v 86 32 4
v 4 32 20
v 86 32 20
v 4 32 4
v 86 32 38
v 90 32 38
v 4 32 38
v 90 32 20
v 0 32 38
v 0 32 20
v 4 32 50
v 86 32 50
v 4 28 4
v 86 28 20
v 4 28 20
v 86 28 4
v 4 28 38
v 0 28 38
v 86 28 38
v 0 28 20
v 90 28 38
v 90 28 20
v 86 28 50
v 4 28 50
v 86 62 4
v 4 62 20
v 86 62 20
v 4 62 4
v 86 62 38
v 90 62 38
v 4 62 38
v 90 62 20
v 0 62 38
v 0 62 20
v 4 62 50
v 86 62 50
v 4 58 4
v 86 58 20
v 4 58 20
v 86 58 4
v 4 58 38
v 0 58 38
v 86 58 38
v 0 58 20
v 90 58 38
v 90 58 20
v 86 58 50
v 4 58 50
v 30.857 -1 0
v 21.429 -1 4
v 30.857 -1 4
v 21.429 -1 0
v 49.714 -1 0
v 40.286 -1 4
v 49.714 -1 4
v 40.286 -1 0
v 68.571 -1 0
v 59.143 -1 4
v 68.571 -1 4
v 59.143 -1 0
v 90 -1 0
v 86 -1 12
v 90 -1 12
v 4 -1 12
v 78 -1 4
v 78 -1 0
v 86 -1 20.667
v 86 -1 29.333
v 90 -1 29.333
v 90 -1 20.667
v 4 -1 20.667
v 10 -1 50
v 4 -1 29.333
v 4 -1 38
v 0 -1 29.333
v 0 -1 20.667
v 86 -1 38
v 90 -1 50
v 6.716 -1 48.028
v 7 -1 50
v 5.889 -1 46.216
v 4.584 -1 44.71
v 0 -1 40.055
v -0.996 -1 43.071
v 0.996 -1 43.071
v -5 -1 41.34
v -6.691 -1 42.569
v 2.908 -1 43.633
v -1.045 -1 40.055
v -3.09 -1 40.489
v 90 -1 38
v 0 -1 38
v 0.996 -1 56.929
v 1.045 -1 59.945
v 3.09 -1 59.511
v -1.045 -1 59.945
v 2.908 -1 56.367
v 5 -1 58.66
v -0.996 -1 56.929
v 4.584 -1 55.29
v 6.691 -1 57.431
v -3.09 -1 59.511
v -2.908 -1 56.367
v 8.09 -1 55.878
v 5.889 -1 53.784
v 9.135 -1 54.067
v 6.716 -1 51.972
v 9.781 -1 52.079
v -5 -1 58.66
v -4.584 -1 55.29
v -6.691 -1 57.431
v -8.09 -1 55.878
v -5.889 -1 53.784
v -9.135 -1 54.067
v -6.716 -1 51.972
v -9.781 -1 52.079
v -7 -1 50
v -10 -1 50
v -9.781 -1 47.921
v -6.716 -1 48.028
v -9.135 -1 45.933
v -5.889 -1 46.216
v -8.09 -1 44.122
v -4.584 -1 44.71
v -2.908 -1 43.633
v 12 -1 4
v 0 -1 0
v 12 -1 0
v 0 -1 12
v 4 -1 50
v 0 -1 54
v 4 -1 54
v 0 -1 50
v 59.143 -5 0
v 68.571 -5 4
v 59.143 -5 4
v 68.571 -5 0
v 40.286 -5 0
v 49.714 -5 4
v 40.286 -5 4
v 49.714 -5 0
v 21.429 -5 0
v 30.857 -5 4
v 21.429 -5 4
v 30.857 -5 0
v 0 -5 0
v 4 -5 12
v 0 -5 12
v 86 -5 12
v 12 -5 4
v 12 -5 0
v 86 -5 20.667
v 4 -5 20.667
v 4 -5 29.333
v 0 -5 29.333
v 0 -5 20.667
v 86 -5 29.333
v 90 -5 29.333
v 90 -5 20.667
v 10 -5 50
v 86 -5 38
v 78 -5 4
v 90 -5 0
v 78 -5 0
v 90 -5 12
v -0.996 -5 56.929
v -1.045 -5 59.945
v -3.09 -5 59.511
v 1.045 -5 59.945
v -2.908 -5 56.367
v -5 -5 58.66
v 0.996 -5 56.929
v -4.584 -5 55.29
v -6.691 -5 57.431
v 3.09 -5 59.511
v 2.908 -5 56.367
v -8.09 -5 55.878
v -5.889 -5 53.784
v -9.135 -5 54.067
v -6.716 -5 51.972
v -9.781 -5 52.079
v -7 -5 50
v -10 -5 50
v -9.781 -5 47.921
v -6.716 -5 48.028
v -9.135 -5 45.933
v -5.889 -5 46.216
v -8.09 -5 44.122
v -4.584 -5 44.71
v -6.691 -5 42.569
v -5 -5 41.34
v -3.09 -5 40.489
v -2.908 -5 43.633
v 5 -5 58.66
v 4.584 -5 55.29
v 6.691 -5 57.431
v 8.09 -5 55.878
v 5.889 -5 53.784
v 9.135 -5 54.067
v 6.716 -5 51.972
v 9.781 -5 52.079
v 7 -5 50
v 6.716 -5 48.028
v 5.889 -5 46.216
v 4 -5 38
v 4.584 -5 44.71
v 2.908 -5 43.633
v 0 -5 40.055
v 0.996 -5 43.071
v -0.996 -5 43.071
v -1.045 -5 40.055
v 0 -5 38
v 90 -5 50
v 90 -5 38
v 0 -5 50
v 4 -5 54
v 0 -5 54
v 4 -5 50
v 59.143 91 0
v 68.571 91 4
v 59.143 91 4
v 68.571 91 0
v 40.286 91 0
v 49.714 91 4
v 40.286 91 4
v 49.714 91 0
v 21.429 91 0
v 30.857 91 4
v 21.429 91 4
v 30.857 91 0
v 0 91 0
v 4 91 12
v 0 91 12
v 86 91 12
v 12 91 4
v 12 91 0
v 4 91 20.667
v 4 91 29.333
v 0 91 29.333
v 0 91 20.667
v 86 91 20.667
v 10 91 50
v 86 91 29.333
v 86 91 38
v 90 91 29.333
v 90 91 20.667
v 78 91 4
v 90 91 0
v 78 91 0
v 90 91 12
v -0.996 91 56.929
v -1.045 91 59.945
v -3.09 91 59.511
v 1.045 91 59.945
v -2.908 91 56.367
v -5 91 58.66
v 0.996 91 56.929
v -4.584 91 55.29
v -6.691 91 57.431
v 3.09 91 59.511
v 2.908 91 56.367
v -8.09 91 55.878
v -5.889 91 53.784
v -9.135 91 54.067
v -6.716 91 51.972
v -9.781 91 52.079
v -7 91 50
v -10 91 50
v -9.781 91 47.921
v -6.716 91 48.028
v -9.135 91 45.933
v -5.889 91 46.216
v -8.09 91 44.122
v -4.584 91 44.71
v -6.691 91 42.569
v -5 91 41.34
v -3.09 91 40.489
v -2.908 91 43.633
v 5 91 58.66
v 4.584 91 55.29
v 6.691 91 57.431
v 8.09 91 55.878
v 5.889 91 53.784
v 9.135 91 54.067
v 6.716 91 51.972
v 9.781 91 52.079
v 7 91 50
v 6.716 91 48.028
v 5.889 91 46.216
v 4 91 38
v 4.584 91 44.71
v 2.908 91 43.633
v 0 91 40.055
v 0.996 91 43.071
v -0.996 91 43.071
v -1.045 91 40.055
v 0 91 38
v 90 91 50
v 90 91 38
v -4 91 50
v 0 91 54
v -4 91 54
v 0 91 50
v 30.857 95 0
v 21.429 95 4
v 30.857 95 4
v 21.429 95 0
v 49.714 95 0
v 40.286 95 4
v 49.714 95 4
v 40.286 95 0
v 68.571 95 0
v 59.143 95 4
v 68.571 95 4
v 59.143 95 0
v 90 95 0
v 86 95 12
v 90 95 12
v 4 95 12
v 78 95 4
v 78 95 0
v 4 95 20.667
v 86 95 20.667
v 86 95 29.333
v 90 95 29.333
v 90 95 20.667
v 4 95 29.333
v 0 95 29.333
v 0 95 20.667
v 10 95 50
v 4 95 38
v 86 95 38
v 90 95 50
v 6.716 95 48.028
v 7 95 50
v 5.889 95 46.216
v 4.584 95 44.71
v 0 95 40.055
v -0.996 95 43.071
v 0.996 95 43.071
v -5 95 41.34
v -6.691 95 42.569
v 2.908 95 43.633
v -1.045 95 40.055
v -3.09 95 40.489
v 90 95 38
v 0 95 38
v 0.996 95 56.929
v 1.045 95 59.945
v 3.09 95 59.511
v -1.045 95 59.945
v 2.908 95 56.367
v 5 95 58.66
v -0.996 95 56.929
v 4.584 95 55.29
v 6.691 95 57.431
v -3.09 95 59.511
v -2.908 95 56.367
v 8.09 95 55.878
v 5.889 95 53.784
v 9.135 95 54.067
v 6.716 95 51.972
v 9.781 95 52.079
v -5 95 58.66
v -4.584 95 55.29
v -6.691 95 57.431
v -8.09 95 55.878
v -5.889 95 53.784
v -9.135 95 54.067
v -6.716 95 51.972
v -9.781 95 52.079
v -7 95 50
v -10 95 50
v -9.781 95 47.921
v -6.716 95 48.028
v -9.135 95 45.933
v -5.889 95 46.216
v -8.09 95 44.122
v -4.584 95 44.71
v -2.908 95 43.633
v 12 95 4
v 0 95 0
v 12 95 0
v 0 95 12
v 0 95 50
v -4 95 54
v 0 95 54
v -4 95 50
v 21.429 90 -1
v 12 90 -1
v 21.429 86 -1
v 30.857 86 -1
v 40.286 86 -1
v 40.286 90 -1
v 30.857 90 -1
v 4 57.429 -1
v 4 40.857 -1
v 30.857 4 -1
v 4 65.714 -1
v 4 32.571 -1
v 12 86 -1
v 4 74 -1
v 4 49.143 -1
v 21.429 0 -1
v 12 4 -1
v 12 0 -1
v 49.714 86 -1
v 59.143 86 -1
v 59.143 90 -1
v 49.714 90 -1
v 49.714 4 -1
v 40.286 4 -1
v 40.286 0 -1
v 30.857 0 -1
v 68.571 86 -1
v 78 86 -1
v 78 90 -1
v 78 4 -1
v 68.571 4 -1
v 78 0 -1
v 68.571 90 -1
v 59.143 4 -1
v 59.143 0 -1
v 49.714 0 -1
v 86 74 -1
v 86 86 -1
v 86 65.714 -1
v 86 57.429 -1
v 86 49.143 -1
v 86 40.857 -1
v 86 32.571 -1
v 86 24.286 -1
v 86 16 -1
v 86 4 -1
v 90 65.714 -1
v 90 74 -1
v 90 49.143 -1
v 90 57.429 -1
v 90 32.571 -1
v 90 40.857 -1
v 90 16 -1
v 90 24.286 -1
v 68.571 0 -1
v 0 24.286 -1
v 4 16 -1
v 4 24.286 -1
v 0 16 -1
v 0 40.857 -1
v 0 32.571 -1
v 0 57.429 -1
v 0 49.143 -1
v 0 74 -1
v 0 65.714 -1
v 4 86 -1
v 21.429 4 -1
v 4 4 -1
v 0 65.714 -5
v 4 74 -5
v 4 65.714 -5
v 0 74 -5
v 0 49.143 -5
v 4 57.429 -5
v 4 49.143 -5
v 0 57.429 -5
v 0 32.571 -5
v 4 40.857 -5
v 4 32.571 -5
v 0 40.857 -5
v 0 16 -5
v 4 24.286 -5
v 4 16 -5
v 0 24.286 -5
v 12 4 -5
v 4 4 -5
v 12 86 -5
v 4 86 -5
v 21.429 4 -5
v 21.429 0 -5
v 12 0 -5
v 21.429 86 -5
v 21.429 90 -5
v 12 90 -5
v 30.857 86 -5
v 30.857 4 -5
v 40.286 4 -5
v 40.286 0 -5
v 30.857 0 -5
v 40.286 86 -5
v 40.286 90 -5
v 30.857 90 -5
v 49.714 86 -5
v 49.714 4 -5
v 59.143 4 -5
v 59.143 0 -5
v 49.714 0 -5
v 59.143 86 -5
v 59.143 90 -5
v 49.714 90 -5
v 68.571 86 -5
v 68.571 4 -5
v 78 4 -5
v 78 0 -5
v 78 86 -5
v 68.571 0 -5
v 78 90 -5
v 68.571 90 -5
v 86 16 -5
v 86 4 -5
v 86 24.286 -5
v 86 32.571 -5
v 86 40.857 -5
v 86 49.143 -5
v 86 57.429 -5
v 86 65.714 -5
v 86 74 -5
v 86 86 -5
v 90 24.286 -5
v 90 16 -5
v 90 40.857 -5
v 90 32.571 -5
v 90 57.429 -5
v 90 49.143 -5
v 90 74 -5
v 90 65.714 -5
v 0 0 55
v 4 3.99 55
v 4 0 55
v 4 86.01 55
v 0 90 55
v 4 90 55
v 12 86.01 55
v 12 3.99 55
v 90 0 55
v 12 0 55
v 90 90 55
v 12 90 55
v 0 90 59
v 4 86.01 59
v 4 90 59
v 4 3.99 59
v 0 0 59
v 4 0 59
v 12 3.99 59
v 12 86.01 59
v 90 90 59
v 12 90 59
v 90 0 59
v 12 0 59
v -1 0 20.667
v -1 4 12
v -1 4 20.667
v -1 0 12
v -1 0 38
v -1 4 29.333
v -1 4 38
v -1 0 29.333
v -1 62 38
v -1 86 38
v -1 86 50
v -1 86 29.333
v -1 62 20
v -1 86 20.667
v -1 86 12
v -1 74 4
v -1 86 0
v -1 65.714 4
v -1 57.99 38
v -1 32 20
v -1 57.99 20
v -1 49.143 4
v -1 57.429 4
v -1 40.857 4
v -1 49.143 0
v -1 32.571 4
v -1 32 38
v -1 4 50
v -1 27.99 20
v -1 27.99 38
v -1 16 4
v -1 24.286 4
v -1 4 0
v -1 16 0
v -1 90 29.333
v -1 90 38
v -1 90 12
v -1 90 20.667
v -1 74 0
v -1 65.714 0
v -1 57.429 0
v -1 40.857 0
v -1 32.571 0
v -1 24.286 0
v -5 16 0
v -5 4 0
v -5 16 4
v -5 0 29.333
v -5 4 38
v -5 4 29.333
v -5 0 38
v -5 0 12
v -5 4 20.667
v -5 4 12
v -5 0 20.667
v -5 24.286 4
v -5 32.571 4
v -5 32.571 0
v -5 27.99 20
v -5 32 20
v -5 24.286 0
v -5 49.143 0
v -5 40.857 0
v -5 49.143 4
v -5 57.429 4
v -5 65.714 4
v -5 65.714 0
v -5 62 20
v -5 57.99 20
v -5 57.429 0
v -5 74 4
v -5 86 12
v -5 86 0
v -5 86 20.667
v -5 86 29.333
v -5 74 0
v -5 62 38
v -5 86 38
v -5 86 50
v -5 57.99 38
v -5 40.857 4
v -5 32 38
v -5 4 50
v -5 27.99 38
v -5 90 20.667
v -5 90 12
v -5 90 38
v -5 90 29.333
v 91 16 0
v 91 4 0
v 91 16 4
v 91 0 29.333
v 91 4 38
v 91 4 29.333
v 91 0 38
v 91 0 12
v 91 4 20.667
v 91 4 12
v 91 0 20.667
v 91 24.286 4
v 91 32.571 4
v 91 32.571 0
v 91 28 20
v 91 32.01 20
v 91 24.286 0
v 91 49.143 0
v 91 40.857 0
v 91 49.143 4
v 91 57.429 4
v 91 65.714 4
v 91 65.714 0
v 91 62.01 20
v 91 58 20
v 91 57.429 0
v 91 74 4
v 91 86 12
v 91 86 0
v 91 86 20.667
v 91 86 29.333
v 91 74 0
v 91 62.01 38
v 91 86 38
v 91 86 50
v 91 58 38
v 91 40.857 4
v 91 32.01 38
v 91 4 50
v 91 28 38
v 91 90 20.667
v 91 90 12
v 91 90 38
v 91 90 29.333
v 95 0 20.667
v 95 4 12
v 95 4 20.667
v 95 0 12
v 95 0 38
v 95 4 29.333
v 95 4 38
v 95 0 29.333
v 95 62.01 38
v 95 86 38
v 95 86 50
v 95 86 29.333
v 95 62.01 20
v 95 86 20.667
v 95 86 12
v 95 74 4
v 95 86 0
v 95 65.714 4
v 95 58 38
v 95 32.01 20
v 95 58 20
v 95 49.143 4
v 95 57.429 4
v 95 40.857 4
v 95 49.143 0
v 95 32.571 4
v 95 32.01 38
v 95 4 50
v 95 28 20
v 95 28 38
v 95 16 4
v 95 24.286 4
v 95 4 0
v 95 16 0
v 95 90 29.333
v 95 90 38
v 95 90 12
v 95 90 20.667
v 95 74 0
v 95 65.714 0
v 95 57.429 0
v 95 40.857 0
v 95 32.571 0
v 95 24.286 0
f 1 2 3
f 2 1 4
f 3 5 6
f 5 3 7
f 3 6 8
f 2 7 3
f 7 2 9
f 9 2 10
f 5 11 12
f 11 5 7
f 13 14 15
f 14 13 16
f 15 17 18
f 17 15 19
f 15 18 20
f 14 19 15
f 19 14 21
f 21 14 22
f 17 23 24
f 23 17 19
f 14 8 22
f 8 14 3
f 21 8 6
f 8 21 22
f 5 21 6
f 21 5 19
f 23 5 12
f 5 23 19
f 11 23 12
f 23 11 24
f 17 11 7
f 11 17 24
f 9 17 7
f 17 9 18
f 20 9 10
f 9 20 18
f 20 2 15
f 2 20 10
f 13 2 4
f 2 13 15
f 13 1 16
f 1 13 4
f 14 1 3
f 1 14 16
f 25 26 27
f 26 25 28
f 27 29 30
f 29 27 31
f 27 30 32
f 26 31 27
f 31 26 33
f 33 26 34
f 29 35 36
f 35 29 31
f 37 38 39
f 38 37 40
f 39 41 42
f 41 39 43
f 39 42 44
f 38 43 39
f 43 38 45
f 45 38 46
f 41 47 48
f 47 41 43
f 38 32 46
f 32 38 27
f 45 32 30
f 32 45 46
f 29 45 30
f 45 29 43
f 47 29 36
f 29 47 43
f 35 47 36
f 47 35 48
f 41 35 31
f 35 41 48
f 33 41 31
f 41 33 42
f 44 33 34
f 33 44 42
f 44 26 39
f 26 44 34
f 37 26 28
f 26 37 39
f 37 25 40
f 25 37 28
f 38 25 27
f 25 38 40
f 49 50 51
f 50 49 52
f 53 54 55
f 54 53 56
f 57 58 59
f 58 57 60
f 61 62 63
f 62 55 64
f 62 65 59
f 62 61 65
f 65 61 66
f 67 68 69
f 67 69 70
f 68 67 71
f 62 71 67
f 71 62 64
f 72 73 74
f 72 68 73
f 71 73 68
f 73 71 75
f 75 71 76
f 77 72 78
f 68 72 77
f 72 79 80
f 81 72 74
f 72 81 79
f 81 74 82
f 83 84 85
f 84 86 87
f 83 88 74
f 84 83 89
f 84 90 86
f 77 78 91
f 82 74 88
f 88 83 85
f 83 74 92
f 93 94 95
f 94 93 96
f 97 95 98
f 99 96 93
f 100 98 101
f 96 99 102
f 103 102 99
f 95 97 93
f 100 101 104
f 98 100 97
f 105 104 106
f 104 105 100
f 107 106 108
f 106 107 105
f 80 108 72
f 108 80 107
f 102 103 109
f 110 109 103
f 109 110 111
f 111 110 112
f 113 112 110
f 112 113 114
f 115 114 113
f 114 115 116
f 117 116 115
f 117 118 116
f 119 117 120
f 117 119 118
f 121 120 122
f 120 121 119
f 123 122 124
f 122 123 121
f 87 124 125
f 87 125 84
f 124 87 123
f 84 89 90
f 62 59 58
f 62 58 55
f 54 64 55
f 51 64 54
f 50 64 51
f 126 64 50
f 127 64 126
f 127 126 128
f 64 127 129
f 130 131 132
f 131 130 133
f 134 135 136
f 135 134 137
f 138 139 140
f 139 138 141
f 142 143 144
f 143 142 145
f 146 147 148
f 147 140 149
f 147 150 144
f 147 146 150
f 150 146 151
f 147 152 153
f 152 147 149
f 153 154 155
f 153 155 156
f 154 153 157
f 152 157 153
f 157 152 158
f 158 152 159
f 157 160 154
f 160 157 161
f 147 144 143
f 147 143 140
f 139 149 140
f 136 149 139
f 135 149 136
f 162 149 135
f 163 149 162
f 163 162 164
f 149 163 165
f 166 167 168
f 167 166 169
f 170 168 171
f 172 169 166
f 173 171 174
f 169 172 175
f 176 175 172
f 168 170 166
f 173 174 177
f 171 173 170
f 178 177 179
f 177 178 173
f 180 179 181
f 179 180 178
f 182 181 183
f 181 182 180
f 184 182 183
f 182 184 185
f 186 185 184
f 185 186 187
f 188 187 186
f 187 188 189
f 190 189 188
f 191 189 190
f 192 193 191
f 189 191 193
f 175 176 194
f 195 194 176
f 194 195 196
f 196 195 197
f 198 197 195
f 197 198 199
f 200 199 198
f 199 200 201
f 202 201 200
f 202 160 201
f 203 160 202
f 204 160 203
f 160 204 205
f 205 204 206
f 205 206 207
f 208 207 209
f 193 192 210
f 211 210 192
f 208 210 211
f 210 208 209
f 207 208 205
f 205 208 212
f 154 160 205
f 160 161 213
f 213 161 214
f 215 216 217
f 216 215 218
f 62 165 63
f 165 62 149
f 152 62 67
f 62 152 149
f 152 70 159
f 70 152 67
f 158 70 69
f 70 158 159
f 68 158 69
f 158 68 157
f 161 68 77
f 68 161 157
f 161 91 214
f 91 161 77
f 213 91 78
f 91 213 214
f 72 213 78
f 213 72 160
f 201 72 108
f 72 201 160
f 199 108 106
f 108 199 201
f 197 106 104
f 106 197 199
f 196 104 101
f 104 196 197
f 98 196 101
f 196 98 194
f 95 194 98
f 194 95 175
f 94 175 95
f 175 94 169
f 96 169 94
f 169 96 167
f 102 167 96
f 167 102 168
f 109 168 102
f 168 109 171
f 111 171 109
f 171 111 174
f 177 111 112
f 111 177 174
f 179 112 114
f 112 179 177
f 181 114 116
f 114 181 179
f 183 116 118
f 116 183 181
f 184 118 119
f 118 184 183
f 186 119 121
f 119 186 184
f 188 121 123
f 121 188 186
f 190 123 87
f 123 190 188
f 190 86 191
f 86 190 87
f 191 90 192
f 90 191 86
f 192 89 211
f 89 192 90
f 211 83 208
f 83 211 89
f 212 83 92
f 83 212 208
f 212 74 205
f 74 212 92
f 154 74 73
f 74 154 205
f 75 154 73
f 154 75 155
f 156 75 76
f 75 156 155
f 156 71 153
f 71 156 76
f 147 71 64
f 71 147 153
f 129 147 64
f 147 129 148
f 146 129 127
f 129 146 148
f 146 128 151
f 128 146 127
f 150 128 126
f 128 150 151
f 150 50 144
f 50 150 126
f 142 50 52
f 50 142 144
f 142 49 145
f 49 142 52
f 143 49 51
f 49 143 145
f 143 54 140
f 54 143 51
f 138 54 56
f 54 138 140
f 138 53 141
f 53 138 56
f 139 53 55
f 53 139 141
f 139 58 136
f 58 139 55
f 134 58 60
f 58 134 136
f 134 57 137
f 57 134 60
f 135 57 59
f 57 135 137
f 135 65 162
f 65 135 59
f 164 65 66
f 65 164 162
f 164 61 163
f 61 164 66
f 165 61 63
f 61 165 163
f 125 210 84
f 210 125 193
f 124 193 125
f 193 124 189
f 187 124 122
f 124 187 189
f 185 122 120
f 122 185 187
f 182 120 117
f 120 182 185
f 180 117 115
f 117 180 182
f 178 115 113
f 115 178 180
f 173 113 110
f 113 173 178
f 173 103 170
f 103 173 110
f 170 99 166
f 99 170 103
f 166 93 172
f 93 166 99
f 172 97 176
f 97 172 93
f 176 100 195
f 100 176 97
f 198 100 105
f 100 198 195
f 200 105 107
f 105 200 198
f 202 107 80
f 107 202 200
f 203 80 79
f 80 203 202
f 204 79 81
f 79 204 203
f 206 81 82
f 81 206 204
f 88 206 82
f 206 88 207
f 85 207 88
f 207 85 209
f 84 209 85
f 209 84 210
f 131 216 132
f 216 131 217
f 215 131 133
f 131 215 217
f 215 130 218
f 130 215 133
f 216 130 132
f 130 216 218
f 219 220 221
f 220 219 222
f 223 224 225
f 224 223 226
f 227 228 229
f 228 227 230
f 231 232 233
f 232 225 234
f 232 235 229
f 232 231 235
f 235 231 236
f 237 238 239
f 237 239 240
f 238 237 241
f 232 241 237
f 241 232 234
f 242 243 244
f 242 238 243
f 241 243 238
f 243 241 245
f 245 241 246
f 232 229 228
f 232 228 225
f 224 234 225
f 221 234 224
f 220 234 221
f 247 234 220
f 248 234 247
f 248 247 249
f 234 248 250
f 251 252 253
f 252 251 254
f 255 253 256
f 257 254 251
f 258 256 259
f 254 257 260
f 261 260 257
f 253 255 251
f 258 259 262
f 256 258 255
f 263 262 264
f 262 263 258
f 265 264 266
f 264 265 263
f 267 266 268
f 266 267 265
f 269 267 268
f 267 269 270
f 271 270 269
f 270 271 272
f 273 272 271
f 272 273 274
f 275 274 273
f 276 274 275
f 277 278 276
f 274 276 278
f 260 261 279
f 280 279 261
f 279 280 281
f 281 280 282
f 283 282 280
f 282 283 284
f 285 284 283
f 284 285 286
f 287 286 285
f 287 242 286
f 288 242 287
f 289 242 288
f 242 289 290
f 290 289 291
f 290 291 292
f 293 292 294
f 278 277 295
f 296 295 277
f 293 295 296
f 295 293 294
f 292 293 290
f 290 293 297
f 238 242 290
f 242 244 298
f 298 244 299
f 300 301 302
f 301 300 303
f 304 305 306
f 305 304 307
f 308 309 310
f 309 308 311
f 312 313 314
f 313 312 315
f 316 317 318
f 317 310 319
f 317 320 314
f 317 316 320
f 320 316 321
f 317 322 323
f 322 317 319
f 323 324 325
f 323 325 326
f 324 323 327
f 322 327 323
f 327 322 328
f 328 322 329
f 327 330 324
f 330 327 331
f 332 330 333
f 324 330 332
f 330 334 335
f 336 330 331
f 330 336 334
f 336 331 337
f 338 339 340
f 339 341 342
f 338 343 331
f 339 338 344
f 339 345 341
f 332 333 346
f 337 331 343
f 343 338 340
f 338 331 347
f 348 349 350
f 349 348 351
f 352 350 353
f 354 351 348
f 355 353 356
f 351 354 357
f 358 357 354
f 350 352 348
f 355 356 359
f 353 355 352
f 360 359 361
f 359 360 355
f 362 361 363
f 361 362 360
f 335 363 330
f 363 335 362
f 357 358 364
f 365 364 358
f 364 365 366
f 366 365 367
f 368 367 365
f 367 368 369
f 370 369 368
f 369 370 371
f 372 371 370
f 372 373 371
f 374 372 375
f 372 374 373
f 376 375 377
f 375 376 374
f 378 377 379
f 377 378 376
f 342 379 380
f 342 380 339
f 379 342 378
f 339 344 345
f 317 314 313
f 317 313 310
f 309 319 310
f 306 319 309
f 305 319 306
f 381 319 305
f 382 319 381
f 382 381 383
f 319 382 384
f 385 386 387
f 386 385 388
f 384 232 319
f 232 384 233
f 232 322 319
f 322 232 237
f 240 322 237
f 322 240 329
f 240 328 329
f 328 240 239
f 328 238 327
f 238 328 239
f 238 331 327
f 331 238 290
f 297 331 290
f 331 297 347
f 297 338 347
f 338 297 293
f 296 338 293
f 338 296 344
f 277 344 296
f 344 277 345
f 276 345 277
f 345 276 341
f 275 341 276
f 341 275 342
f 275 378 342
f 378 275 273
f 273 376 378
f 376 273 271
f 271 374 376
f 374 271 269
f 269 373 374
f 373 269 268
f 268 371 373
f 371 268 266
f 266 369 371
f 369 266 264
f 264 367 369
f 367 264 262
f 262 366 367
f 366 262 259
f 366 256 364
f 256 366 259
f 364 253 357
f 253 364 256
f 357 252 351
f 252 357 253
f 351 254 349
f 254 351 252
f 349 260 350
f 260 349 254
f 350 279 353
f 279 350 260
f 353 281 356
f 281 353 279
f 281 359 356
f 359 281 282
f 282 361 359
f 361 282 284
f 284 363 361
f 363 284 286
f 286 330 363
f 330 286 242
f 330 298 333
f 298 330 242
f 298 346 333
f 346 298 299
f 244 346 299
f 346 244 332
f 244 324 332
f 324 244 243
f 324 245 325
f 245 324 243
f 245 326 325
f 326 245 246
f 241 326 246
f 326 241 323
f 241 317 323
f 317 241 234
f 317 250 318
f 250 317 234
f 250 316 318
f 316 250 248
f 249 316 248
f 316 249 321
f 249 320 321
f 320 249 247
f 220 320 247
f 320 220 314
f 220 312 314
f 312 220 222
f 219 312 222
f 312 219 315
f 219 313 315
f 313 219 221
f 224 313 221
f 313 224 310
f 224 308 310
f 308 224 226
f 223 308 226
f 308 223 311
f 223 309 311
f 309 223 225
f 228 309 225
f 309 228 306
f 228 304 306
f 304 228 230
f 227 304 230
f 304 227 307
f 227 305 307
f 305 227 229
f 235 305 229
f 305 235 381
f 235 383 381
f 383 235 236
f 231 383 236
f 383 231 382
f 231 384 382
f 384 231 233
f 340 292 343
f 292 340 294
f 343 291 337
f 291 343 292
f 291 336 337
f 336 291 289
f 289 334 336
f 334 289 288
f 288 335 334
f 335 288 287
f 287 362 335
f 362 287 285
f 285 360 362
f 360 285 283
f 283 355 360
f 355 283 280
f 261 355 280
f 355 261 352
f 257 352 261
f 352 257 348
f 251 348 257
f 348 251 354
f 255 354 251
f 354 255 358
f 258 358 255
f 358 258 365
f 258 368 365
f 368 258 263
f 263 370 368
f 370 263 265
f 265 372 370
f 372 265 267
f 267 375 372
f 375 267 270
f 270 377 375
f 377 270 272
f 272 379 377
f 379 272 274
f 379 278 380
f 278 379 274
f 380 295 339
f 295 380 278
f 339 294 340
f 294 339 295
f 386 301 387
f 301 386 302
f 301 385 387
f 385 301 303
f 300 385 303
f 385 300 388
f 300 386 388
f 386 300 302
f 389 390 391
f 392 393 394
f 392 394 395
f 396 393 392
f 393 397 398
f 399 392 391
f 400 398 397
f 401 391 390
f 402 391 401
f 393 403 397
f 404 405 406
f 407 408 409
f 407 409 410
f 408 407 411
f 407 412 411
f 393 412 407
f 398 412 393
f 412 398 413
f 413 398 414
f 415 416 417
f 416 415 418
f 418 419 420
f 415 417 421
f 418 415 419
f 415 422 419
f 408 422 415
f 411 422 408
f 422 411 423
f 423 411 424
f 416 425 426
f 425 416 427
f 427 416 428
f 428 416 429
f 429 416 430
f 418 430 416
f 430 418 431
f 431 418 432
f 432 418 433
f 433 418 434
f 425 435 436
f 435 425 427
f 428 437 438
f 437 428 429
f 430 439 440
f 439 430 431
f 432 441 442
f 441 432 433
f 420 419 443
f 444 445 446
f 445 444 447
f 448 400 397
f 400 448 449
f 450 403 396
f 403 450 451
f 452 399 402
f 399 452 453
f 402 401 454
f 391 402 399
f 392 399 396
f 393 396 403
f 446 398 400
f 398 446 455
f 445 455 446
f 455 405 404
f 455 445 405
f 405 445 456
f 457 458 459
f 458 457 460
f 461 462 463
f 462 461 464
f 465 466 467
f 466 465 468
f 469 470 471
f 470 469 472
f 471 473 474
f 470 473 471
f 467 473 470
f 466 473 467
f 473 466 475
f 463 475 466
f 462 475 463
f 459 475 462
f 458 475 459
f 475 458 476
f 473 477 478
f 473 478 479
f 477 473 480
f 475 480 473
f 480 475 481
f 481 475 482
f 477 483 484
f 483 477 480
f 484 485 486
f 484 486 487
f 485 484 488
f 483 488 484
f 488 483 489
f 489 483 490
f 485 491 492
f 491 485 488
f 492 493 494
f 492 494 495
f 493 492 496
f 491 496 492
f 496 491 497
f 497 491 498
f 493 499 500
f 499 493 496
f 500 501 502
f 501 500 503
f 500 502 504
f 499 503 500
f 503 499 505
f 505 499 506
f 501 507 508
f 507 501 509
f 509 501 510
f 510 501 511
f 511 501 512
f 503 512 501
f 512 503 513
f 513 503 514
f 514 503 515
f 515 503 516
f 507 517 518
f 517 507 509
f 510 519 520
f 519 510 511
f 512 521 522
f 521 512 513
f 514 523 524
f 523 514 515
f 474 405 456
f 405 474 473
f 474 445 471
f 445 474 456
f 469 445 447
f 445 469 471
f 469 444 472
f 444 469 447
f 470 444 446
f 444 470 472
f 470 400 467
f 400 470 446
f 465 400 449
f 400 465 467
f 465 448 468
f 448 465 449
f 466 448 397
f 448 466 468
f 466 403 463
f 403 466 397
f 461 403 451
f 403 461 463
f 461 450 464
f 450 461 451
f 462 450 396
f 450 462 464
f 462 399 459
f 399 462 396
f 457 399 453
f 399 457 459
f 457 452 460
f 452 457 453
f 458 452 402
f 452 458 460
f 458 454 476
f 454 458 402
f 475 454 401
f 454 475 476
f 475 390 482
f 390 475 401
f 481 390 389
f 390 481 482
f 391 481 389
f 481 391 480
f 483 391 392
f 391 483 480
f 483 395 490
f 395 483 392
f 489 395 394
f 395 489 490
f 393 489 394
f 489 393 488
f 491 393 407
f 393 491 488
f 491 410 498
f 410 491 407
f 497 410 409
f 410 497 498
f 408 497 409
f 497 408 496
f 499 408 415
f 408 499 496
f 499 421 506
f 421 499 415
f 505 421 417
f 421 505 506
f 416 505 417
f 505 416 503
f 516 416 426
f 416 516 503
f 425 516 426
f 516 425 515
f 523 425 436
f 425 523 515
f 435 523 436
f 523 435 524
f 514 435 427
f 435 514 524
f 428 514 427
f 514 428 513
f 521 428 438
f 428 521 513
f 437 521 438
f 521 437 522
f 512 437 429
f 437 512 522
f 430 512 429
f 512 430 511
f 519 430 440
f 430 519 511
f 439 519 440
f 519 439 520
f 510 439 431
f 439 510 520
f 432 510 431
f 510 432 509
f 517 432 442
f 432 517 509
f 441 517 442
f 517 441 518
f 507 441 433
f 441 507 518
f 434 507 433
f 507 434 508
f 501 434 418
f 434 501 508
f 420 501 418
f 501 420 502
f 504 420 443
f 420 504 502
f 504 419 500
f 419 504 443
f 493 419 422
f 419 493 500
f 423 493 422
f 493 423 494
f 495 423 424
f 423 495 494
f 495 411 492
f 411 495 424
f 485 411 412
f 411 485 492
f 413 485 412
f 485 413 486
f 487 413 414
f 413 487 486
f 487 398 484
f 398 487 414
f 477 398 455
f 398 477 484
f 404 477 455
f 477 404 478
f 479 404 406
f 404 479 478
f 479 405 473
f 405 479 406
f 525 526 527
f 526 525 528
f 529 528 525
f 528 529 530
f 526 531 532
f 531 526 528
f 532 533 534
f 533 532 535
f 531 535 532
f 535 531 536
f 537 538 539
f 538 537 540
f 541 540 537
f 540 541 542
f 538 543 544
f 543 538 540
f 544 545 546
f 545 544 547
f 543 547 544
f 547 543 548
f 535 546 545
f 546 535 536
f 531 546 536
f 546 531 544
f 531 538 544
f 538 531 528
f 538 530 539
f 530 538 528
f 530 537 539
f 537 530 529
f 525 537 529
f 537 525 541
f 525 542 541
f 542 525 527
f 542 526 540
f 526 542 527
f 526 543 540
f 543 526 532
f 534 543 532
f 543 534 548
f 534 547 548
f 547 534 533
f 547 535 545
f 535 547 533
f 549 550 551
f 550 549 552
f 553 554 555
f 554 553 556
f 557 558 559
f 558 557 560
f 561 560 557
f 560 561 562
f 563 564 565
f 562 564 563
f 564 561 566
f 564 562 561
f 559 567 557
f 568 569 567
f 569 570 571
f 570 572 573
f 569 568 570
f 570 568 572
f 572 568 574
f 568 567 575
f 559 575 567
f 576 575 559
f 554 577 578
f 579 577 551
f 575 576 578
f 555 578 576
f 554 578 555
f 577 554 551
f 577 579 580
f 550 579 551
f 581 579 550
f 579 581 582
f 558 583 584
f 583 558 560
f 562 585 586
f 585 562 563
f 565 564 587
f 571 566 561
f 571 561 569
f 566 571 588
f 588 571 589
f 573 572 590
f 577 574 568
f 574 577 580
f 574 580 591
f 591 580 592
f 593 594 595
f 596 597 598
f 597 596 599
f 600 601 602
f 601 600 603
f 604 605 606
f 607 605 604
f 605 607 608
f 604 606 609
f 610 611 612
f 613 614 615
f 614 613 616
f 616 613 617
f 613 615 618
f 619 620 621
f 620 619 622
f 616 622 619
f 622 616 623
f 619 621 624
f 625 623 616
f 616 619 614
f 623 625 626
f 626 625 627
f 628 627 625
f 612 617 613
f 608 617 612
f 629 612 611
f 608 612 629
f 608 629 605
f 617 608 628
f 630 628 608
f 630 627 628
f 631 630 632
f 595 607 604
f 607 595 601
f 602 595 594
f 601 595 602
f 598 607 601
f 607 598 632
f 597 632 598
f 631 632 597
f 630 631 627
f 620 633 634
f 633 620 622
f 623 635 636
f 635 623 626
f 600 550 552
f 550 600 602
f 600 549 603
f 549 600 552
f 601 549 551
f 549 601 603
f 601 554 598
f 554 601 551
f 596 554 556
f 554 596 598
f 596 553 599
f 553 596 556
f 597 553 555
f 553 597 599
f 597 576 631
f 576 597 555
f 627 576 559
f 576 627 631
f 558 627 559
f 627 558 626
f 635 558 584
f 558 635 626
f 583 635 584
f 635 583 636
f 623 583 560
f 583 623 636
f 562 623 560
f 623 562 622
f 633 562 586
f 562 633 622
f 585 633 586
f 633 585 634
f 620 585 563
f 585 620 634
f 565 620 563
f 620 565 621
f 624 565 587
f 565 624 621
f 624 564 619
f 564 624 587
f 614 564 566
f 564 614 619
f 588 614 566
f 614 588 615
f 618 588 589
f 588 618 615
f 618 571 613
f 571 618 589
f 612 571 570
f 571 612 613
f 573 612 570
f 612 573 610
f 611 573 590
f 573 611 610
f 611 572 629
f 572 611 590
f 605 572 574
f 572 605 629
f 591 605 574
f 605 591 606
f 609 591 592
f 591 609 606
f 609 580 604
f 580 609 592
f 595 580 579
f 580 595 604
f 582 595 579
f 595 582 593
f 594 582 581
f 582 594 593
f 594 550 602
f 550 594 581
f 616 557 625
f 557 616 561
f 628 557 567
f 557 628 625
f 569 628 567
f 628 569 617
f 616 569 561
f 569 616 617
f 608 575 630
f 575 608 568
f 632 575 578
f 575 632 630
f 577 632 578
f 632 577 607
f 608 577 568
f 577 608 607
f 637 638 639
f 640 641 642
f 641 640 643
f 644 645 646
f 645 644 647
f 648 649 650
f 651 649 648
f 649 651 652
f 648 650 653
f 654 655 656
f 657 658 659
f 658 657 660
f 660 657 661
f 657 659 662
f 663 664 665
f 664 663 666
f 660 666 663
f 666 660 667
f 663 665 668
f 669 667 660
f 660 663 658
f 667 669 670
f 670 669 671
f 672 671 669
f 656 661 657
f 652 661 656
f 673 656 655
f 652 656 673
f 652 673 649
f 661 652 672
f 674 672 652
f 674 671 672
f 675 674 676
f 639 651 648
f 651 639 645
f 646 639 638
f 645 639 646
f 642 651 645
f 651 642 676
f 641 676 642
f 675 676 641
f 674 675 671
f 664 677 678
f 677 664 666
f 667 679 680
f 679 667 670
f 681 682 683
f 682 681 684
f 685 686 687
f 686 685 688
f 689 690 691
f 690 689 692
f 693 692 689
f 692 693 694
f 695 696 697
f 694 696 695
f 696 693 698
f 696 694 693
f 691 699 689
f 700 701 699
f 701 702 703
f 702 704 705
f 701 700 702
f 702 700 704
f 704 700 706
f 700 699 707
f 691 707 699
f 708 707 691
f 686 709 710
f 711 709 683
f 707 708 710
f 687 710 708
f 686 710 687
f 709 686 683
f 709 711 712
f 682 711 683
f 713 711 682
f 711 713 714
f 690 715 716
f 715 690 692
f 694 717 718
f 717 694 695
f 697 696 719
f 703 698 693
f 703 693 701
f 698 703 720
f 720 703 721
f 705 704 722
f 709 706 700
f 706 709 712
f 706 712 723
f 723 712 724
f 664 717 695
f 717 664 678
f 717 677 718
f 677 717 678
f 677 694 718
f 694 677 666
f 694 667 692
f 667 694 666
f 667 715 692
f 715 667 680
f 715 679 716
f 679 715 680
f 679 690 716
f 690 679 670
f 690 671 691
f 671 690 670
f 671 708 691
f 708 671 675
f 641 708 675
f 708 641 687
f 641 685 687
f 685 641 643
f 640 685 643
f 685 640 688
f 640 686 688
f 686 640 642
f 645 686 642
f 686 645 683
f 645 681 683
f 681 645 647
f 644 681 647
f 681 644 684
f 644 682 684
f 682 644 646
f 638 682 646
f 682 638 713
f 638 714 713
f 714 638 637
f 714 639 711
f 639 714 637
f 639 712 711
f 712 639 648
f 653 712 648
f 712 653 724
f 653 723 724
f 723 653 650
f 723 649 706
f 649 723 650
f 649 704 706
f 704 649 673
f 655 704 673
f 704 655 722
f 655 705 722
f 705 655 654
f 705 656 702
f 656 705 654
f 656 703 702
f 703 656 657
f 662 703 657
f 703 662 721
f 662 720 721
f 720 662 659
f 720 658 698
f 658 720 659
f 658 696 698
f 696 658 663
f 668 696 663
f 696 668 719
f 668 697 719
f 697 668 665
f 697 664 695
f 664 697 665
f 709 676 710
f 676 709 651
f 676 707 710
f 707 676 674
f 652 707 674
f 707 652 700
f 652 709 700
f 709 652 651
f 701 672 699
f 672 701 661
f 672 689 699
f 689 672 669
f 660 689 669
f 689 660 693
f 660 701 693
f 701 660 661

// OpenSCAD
include <../box.scad>
box(width = 90, height = 50, depth = 90, dividers = [ 2, 0 ], ears = 10, thickness = 4, open = false, assemble = true, labels = true, explode = 5);
